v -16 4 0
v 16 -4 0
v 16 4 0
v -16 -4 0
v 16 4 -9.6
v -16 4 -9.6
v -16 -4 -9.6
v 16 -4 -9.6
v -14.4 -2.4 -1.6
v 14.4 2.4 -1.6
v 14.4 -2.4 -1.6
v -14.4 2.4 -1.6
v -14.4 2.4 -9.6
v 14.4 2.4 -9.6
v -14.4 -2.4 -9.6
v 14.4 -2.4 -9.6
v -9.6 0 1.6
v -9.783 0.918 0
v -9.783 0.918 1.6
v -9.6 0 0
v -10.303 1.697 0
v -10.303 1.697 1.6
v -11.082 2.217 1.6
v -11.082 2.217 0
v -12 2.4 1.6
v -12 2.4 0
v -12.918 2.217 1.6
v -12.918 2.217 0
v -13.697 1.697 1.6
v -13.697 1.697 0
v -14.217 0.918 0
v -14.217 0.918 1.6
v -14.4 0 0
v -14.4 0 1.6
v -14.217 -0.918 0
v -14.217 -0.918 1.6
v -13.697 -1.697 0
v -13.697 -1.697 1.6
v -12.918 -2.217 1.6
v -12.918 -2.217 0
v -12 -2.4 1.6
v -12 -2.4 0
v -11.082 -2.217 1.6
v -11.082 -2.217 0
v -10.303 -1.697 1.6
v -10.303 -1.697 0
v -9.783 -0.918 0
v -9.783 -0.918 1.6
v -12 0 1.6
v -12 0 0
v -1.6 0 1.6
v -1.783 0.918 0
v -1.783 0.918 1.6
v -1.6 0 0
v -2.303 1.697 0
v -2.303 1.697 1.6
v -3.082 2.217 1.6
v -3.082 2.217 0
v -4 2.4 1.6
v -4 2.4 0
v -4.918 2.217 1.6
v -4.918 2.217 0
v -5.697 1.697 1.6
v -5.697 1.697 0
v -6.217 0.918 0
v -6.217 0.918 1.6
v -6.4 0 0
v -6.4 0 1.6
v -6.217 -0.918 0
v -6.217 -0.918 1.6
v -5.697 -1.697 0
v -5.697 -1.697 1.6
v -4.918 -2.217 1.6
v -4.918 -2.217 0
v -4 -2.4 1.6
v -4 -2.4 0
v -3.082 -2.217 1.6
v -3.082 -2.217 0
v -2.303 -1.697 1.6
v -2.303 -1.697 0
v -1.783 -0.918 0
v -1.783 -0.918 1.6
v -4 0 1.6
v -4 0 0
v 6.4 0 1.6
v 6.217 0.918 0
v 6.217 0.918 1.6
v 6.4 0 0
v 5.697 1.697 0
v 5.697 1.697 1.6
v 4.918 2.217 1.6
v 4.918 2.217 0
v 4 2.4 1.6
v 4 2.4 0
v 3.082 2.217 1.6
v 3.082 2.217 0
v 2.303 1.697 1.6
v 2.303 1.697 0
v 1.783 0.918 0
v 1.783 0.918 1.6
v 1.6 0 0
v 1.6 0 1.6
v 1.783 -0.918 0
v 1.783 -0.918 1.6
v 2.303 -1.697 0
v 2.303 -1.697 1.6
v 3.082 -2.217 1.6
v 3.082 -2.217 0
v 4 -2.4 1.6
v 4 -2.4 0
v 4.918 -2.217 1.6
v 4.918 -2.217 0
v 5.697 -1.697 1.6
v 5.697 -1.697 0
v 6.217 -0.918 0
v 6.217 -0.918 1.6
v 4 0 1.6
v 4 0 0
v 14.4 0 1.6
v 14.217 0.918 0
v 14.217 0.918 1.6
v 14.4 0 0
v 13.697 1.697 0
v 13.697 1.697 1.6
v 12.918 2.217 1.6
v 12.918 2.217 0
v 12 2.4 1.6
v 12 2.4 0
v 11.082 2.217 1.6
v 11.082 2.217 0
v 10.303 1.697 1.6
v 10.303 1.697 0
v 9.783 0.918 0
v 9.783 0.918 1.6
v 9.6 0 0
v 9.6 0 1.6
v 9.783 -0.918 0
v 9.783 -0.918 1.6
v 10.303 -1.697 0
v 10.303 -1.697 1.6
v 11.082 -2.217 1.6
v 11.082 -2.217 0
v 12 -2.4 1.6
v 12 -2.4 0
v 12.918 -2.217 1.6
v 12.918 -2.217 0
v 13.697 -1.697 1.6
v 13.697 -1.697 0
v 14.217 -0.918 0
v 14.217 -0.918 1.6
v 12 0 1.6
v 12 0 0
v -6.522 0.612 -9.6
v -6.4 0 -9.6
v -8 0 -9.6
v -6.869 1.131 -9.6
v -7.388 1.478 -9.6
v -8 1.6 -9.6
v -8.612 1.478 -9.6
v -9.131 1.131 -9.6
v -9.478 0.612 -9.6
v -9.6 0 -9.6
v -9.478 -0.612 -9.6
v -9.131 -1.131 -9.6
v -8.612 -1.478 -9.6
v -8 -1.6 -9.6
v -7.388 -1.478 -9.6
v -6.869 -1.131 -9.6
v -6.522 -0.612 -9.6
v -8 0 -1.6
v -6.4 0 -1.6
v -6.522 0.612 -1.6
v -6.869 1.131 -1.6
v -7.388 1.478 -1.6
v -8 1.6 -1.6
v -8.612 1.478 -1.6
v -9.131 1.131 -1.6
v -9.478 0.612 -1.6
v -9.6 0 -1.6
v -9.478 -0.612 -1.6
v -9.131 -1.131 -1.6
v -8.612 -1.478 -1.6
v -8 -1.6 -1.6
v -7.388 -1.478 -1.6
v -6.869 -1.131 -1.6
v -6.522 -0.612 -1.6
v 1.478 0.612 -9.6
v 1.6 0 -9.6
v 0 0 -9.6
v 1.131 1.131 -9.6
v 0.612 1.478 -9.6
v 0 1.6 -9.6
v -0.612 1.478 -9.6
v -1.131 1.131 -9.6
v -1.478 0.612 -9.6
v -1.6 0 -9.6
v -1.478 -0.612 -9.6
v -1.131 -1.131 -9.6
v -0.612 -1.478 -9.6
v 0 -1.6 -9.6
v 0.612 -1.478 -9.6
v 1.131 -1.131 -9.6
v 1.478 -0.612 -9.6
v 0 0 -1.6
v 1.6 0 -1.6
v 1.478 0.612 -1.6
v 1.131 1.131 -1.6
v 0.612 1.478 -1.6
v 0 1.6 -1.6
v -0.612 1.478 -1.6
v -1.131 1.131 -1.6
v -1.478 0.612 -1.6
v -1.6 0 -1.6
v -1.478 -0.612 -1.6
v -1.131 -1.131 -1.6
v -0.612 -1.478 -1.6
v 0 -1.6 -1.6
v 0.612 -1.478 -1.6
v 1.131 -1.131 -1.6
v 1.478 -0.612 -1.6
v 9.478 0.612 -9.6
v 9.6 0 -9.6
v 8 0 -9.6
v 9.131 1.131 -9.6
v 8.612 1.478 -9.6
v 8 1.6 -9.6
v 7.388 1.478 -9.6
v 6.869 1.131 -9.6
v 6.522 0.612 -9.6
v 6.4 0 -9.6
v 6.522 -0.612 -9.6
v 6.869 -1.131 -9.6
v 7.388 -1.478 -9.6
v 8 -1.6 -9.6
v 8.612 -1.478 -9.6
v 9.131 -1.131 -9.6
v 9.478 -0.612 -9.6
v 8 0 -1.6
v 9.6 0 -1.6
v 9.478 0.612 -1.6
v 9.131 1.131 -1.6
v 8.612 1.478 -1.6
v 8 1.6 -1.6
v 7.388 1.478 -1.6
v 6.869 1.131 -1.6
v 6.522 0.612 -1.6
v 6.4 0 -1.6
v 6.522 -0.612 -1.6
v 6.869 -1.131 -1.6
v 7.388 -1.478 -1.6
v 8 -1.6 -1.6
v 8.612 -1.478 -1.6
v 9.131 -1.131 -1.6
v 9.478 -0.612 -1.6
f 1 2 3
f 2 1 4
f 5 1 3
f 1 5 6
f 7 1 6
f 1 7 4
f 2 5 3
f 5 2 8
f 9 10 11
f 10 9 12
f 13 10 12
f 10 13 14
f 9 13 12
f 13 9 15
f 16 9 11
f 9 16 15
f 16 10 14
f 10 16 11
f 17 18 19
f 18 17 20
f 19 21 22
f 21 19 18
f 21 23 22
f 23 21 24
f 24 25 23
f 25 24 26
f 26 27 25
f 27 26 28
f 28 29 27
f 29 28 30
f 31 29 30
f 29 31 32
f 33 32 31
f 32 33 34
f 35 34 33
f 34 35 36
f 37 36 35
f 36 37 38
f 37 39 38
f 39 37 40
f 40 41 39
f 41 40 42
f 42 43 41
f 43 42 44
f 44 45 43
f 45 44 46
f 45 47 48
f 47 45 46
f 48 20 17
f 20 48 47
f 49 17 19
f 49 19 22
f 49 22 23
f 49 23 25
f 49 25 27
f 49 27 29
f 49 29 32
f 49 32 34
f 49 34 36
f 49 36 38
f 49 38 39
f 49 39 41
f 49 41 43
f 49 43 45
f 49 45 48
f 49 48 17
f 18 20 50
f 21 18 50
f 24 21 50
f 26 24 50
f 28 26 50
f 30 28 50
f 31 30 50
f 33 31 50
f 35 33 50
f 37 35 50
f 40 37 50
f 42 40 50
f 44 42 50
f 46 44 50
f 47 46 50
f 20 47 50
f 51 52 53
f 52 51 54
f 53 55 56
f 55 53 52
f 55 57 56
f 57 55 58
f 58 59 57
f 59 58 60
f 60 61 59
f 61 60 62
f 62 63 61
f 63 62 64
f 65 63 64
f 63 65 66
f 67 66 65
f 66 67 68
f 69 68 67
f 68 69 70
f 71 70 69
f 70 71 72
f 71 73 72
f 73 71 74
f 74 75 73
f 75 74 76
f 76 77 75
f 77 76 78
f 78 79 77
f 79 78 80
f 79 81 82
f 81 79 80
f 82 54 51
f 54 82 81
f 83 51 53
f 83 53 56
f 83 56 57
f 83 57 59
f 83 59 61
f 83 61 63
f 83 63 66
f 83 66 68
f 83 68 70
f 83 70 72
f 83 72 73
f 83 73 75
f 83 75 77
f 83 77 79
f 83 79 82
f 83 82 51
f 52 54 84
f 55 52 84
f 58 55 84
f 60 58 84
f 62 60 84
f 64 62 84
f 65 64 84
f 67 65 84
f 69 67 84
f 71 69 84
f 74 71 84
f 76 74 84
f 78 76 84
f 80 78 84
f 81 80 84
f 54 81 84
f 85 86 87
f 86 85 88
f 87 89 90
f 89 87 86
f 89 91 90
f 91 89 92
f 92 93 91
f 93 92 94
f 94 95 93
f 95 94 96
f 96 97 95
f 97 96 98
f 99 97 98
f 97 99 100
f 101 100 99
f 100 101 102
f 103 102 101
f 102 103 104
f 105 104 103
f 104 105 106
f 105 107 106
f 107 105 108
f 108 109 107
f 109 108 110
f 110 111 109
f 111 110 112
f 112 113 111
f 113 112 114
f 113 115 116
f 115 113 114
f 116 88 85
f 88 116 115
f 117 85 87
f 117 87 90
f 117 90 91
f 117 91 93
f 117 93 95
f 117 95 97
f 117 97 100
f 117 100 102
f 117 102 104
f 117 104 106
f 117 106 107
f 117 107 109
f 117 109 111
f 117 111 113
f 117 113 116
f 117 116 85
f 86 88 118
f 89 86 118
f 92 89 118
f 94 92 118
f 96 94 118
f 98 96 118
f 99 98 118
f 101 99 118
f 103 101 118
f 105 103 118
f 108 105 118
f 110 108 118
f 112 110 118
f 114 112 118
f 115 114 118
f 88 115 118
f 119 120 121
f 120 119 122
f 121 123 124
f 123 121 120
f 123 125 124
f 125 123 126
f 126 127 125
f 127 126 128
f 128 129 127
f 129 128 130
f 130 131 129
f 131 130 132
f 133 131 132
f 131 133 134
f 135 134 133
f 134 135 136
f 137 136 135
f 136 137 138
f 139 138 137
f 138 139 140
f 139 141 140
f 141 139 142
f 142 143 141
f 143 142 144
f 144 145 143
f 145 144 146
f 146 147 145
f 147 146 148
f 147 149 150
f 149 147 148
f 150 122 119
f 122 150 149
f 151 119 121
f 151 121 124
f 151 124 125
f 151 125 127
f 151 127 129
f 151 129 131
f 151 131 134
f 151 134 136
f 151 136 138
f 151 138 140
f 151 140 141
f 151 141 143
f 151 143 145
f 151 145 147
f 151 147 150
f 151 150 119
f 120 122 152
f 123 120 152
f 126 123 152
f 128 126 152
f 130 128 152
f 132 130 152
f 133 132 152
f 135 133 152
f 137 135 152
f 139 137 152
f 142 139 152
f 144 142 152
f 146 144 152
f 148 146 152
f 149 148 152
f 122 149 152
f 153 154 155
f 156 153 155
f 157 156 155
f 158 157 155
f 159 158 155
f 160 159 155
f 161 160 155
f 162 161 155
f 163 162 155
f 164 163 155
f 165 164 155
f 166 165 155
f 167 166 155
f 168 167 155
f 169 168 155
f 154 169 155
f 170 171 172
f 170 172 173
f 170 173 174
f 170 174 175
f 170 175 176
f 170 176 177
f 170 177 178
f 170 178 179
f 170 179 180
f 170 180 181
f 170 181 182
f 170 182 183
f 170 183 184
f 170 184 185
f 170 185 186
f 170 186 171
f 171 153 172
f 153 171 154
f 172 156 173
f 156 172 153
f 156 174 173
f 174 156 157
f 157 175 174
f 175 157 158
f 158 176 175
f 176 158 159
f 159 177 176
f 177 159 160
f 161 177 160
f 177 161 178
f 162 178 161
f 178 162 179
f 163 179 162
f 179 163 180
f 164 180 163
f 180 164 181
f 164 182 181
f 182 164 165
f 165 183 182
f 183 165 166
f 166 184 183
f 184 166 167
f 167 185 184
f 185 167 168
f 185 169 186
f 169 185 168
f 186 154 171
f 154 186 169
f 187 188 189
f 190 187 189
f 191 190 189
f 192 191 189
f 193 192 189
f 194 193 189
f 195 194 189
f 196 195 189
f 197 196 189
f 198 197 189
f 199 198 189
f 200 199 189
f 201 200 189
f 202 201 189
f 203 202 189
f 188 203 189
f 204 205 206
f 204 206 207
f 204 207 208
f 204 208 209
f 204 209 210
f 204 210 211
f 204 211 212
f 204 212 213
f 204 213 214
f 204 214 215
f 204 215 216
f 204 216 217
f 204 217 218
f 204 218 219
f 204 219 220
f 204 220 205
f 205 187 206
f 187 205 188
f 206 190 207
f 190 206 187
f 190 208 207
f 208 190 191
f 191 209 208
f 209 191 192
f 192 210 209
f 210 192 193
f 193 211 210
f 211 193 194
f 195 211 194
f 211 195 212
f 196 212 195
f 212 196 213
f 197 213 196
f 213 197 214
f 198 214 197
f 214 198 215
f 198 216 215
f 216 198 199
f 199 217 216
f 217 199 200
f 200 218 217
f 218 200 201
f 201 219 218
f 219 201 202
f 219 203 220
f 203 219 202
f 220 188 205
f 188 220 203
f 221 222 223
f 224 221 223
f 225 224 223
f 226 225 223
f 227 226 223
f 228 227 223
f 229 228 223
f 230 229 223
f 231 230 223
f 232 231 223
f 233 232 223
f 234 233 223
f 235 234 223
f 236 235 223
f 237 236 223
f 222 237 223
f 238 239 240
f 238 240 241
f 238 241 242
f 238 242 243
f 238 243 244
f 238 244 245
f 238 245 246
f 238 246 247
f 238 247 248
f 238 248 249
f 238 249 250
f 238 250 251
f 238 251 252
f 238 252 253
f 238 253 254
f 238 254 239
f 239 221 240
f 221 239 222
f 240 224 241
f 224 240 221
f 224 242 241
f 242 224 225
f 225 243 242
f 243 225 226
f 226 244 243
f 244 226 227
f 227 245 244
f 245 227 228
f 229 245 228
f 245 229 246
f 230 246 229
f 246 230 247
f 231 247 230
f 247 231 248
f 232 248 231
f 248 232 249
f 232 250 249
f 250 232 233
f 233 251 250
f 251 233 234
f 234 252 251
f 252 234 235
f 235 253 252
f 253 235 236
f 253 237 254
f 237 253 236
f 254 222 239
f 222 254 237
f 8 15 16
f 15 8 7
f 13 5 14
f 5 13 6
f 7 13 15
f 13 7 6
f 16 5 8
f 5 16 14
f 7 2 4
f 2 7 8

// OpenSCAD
// file: ../p/4-4edge.scad
use <../lib.scad>
function ldraw_lib__4_4edge() = [
// 0 Circle 1.0
// 0 Name: 4-4edge.dat
// 0 Author: James Jessiman
// 0 !LDRAW_ORG Primitive UPDATE 2017-01
// 0 !LICENSE Licensed under CC BY 2.0 and CC BY 4.0 : see CAreadme.txt
// 
// 0 BFC CERTIFY CCW
  [0,"BFC","CERTIFY"],
  [0,"BFC","CCW"],
// 
// 0 !HISTORY 1998-12-15 [PTadmin] Official Update 1998-10
// 0 !HISTORY 2005-12-28 [PTadmin] Official Update 2005-01
// 0 !HISTORY 2007-06-24 [PTadmin] Header formatted for Contributor Agreement
// 0 !HISTORY 2008-07-01 [PTadmin] Official Update 2008-01
// 0 !HISTORY 2017-01-15 [Steffen] BFCed
// 0 !HISTORY 2017-12-30 [PTadmin] Official Update 2017-01
// 
// 
// 2 24 1 0 0 0.9239 0 0.3827
  [2,24,1,0,0,0.9239,0,0.3827],
// 2 24 0.9239 0 0.3827 0.7071 0 0.7071
  [2,24,0.9239,0,0.3827,0.7071,0,0.7071],
// 2 24 0.7071 0 0.7071 0.3827 0 0.9239
  [2,24,0.7071,0,0.7071,0.3827,0,0.9239],
// 2 24 0.3827 0 0.9239 0 0 1
  [2,24,0.3827,0,0.9239,0,0,1],
// 2 24 0 0 1 -0.3827 0 0.9239
  [2,24,0,0,1,-0.3827,0,0.9239],
// 2 24 -0.3827 0 0.9239 -0.7071 0 0.7071
  [2,24,-0.3827,0,0.9239,-0.7071,0,0.7071],
// 2 24 -0.7071 0 0.7071 -0.9239 0 0.3827
  [2,24,-0.7071,0,0.7071,-0.9239,0,0.3827],
// 2 24 -0.9239 0 0.3827 -1 0 -0
  [2,24,-0.9239,0,0.3827,-1,0,-0],
// 2 24 -1 0 -0 -0.9239 0 -0.3827
  [2,24,-1,0,-0,-0.9239,0,-0.3827],
// 2 24 -0.9239 0 -0.3827 -0.7071 0 -0.7071
  [2,24,-0.9239,0,-0.3827,-0.7071,0,-0.7071],
// 2 24 -0.7071 0 -0.7071 -0.3827 0 -0.9239
  [2,24,-0.7071,0,-0.7071,-0.3827,0,-0.9239],
// 2 24 -0.3827 0 -0.9239 0 0 -1
  [2,24,-0.3827,0,-0.9239,0,0,-1],
// 2 24 0 0 -1 0.3827 0 -0.9239
  [2,24,0,0,-1,0.3827,0,-0.9239],
// 2 24 0.3827 0 -0.9239 0.7071 0 -0.7071
  [2,24,0.3827,0,-0.9239,0.7071,0,-0.7071],
// 2 24 0.7071 0 -0.7071 0.9239 0 -0.3827
  [2,24,0.7071,0,-0.7071,0.9239,0,-0.3827],
// 2 24 0.9239 0 -0.3827 1 0 0
  [2,24,0.9239,0,-0.3827,1,0,0],
];
module ldraw_lib__4_4edge(step=0, col=false, unit=2/5, alt=false, line=0.2, solid=!$preview)
    makepoly(ldraw_lib__4_4edge(), step=step, col=col, unit=unit, alt=alt, line=line, solid=solid);
ldraw_lib__4_4edge(line=0.2);
// file: ../p/4-4disc.scad
use <../lib.scad>
function ldraw_lib__4_4disc() = [
// 0 Disc 1.0
// 0 Name: 4-4disc.dat
// 0 Author: James Jessiman
// 0 !LDRAW_ORG Primitive UPDATE 2002-02
// 0 !LICENSE Licensed under CC BY 2.0 and CC BY 4.0 : see CAreadme.txt
// 
// 0 BFC CERTIFY CCW
  [0,"BFC","CERTIFY"],
  [0,"BFC","CCW"],
// 
// 0 !HISTORY 1998-12-15 [PTadmin] Official Update 1998-10
// 0 !HISTORY 2002-03-23 [sbliss] Added BFC statement
// 0 !HISTORY 2002-04-25 [PTadmin] Official Update 2002-02
// 0 !HISTORY 2007-06-24 [PTadmin] Header formatted for Contributor Agreement
// 0 !HISTORY 2008-07-01 [PTadmin] Official Update 2008-01
// 
// 
// 3 16 0 0 0 1 0 0 0.9239 0 0.3827
  [3,16,0,0,0,1,0,0,0.9239,0,0.3827],
// 3 16 0 0 0 0.9239 0 0.3827 0.7071 0 0.7071
  [3,16,0,0,0,0.9239,0,0.3827,0.7071,0,0.7071],
// 3 16 0 0 0 0.7071 0 0.7071 0.3827 0 0.9239
  [3,16,0,0,0,0.7071,0,0.7071,0.3827,0,0.9239],
// 3 16 0 0 0 0.3827 0 0.9239 0 0 1
  [3,16,0,0,0,0.3827,0,0.9239,0,0,1],
// 3 16 0 0 0 0 0 1 -0.3827 0 0.9239
  [3,16,0,0,0,0,0,1,-0.3827,0,0.9239],
// 3 16 0 0 0 -0.3827 0 0.9239 -0.7071 0 0.7071
  [3,16,0,0,0,-0.3827,0,0.9239,-0.7071,0,0.7071],
// 3 16 0 0 0 -0.7071 0 0.7071 -0.9239 0 0.3827
  [3,16,0,0,0,-0.7071,0,0.7071,-0.9239,0,0.3827],
// 3 16 0 0 0 -0.9239 0 0.3827 -1 0 -0
  [3,16,0,0,0,-0.9239,0,0.3827,-1,0,-0],
// 3 16 0 0 0 -1 0 -0 -0.9239 0 -0.3827
  [3,16,0,0,0,-1,0,-0,-0.9239,0,-0.3827],
// 3 16 0 0 0 -0.9239 0 -0.3827 -0.7071 0 -0.7071
  [3,16,0,0,0,-0.9239,0,-0.3827,-0.7071,0,-0.7071],
// 3 16 0 0 0 -0.7071 0 -0.7071 -0.3827 0 -0.9239
  [3,16,0,0,0,-0.7071,0,-0.7071,-0.3827,0,-0.9239],
// 3 16 0 0 0 -0.3827 0 -0.9239 0 0 -1
  [3,16,0,0,0,-0.3827,0,-0.9239,0,0,-1],
// 3 16 0 0 0 0 0 -1 0.3827 0 -0.9239
  [3,16,0,0,0,0,0,-1,0.3827,0,-0.9239],
// 3 16 0 0 0 0.3827 0 -0.9239 0.7071 0 -0.7071
  [3,16,0,0,0,0.3827,0,-0.9239,0.7071,0,-0.7071],
// 3 16 0 0 0 0.7071 0 -0.7071 0.9239 0 -0.3827
  [3,16,0,0,0,0.7071,0,-0.7071,0.9239,0,-0.3827],
// 3 16 0 0 0 0.9239 0 -0.3827 1 0 0
  [3,16,0,0,0,0.9239,0,-0.3827,1,0,0],
// 0
];
module ldraw_lib__4_4disc(step=0, col=false, unit=2/5, alt=false, line=0.2, solid=!$preview)
    makepoly(ldraw_lib__4_4disc(), step=step, col=col, unit=unit, alt=alt, line=line, solid=solid);
ldraw_lib__4_4disc(line=0.2);
// file: ../p/4-4cyli.scad
use <../lib.scad>
$fa=1; $fs=0.2;
function ldraw_lib__4_4cyli(realsolid=false) = [
// 0 Cylinder 1.0
// 0 Name: 4-4cyli.dat
// 0 Author: James Jessiman
// 0 !LDRAW_ORG Primitive UPDATE 2005-01
// 0 !LICENSE Licensed under CC BY 2.0 and CC BY 4.0 : see CAreadme.txt
// 
// 0 BFC CERTIFY CCW
  [0,"BFC","CERTIFY"],
  [0,"BFC","CCW"],
// 
// 0 !HISTORY 1998-12-15 [PTadmin] Official Update 1998-10
// 0 !HISTORY 2002-03-23 [sbliss] Added BFC statement; merged headers from files in distributions LDraw 0.27 and Complete.
// 0 !HISTORY 2002-04-25 [PTadmin] Official Update 2002-02
// 0 !HISTORY 2004-12-14 [guyvivan] BFC CCW
// 0 !HISTORY 2005-12-28 [PTadmin] Official Update 2005-01
// 0 !HISTORY 2007-06-24 [PTadmin] Header formatted for Contributor Agreement
// 0 !HISTORY 2008-07-01 [PTadmin] Official Update 2008-01
// 
// 
// 4 16 1 1 0 0.9239 1 0.3827 0.9239 0 0.3827 1 0 0
  [4,16,1,1,0,0.9239,1,0.3827,0.9239,0,0.3827,1,0,0],
// 5 24 1 0 0 1 1 0 0.9239 0 0.3827 0.9239 0 -0.3827
  [5,24,1,0,0,1,1,0,0.9239,0,0.3827,0.9239,0,-0.3827],
// 4 16 0.9239 1 0.3827 0.7071 1 0.7071 0.7071 0 0.7071 0.9239 0 0.3827
  [4,16,0.9239,1,0.3827,0.7071,1,0.7071,0.7071,0,0.7071,0.9239,0,0.3827],
// 5 24 0.9239 0 0.3827 0.9239 1 0.3827 0.7071 0 0.7071 1 0 0
  [5,24,0.9239,0,0.3827,0.9239,1,0.3827,0.7071,0,0.7071,1,0,0],
// 4 16 0.7071 1 0.7071 0.3827 1 0.9239 0.3827 0 0.9239 0.7071 0 0.7071
  [4,16,0.7071,1,0.7071,0.3827,1,0.9239,0.3827,0,0.9239,0.7071,0,0.7071],
// 5 24 0.7071 0 0.7071 0.7071 1 0.7071 0.3827 0 0.9239 0.9239 0 0.3827
  [5,24,0.7071,0,0.7071,0.7071,1,0.7071,0.3827,0,0.9239,0.9239,0,0.3827],
// 4 16 0.3827 1 0.9239 0 1 1 0 0 1 0.3827 0 0.9239
  [4,16,0.3827,1,0.9239,0,1,1,0,0,1,0.3827,0,0.9239],
// 5 24 0.3827 0 0.9239 0.3827 1 0.9239 0 0 1 0.7071 0 0.7071
  [5,24,0.3827,0,0.9239,0.3827,1,0.9239,0,0,1,0.7071,0,0.7071],
// 4 16 0 1 1 -0.3827 1 0.9239 -0.3827 0 0.9239 0 0 1
  [4,16,0,1,1,-0.3827,1,0.9239,-0.3827,0,0.9239,0,0,1],
// 5 24 0 0 1 0 1 1 -0.3827 0 0.9239 0.3827 0 0.9239
  [5,24,0,0,1,0,1,1,-0.3827,0,0.9239,0.3827,0,0.9239],
// 4 16 -0.3827 1 0.9239 -0.7071 1 0.7071 -0.7071 0 0.7071 -0.3827 0 0.9239
  [4,16,-0.3827,1,0.9239,-0.7071,1,0.7071,-0.7071,0,0.7071,-0.3827,0,0.9239],
// 5 24 -0.3827 0 0.9239 -0.3827 1 0.9239 -0.7071 0 0.7071 0 0 1
  [5,24,-0.3827,0,0.9239,-0.3827,1,0.9239,-0.7071,0,0.7071,0,0,1],
// 4 16 -0.7071 1 0.7071 -0.9239 1 0.3827 -0.9239 0 0.3827 -0.7071 0 0.7071
  [4,16,-0.7071,1,0.7071,-0.9239,1,0.3827,-0.9239,0,0.3827,-0.7071,0,0.7071],
// 5 24 -0.7071 0 0.7071 -0.7071 1 0.7071 -0.9239 0 0.3827 -0.3827 0 0.9239
  [5,24,-0.7071,0,0.7071,-0.7071,1,0.7071,-0.9239,0,0.3827,-0.3827,0,0.9239],
// 4 16 -0.9239 1 0.3827 -1 1 0 -1 0 0 -0.9239 0 0.3827
  [4,16,-0.9239,1,0.3827,-1,1,0,-1,0,0,-0.9239,0,0.3827],
// 5 24 -0.9239 0 0.3827 -0.9239 1 0.3827 -1 0 0 -0.7071 0 0.7071
  [5,24,-0.9239,0,0.3827,-0.9239,1,0.3827,-1,0,0,-0.7071,0,0.7071],
// 4 16 -1 1 0 -0.9239 1 -0.3827 -0.9239 0 -0.3827 -1 0 0
  [4,16,-1,1,0,-0.9239,1,-0.3827,-0.9239,0,-0.3827,-1,0,0],
// 5 24 -1 0 0 -1 1 0 -0.9239 0 -0.3827 -0.9239 0 0.3827
  [5,24,-1,0,0,-1,1,0,-0.9239,0,-0.3827,-0.9239,0,0.3827],
// 4 16 -0.9239 1 -0.3827 -0.7071 1 -0.7071 -0.7071 0 -0.7071 -0.9239 0 -0.3827
  [4,16,-0.9239,1,-0.3827,-0.7071,1,-0.7071,-0.7071,0,-0.7071,-0.9239,0,-0.3827],
// 5 24 -0.9239 0 -0.3827 -0.9239 1 -0.3827 -0.7071 0 -0.7071 -1 0 0
  [5,24,-0.9239,0,-0.3827,-0.9239,1,-0.3827,-0.7071,0,-0.7071,-1,0,0],
// 4 16 -0.7071 1 -0.7071 -0.3827 1 -0.9239 -0.3827 0 -0.9239 -0.7071 0 -0.7071
  [4,16,-0.7071,1,-0.7071,-0.3827,1,-0.9239,-0.3827,0,-0.9239,-0.7071,0,-0.7071],
// 5 24 -0.7071 0 -0.7071 -0.7071 1 -0.7071 -0.3827 0 -0.9239 -0.9239 0 -0.3827
  [5,24,-0.7071,0,-0.7071,-0.7071,1,-0.7071,-0.3827,0,-0.9239,-0.9239,0,-0.3827],
// 4 16 -0.3827 1 -0.9239 0 1 -1 0 0 -1 -0.3827 0 -0.9239
  [4,16,-0.3827,1,-0.9239,0,1,-1,0,0,-1,-0.3827,0,-0.9239],
// 5 24 -0.3827 0 -0.9239 -0.3827 1 -0.9239 0 0 -1 -0.7071 0 -0.7071
  [5,24,-0.3827,0,-0.9239,-0.3827,1,-0.9239,0,0,-1,-0.7071,0,-0.7071],
// 4 16 0 1 -1 0.3827 1 -0.9239 0.3827 0 -0.9239 0 0 -1
  [4,16,0,1,-1,0.3827,1,-0.9239,0.3827,0,-0.9239,0,0,-1],
// 5 24 0 0 -1 0 1 -1 0.3827 0 -0.9239 -0.3827 0 -0.9239
  [5,24,0,0,-1,0,1,-1,0.3827,0,-0.9239,-0.3827,0,-0.9239],
// 4 16 0.3827 1 -0.9239 0.7071 1 -0.7071 0.7071 0 -0.7071 0.3827 0 -0.9239
  [4,16,0.3827,1,-0.9239,0.7071,1,-0.7071,0.7071,0,-0.7071,0.3827,0,-0.9239],
// 5 24 0.3827 0 -0.9239 0.3827 1 -0.9239 0.7071 0 -0.7071 0 0 -1
  [5,24,0.3827,0,-0.9239,0.3827,1,-0.9239,0.7071,0,-0.7071,0,0,-1],
// 4 16 0.7071 1 -0.7071 0.9239 1 -0.3827 0.9239 0 -0.3827 0.7071 0 -0.7071
  [4,16,0.7071,1,-0.7071,0.9239,1,-0.3827,0.9239,0,-0.3827,0.7071,0,-0.7071],
// 5 24 0.7071 0 -0.7071 0.7071 1 -0.7071 0.9239 0 -0.3827 0.3827 0 -0.9239
  [5,24,0.7071,0,-0.7071,0.7071,1,-0.7071,0.9239,0,-0.3827,0.3827,0,-0.9239],
// 4 16 0.9239 1 -0.3827 1 1 0 1 0 0 0.9239 0 -0.3827
  [4,16,0.9239,1,-0.3827,1,1,0,1,0,0,0.9239,0,-0.3827],
// 5 24 0.9239 0 -0.3827 0.9239 1 -0.3827 1 0 0 0.7071 0 -0.7071
  [5,24,0.9239,0,-0.3827,0.9239,1,-0.3827,1,0,0,0.7071,0,-0.7071],
// 0
];
module ldraw_lib__4_4cyli(step=0, col=false, unit=2/5, alt=false, line=0.2, solid=!$preview)
    makepoly(ldraw_lib__4_4cyli(solid), step=step, col=col, unit=unit, alt=alt, line=line, solid=solid);
ldraw_lib__4_4cyli(line=0.2);
// file: ../p/stud3.scad
use <../lib.scad>
use <4-4cyli.scad>
use <4-4disc.scad>
use <4-4edge.scad>
function ldraw_lib__stud3() = [
// 0 Stud Tube Solid
// 0 Name: stud3.dat
// 0 Author: James Jessiman
// 0 !LDRAW_ORG Primitive UPDATE 2012-01
// 0 !LICENSE Licensed under CC BY 4.0 : see CAreadme.txt
// 
// 0 BFC CERTIFY CCW
  [0,"BFC","CERTIFY"],
  [0,"BFC","CCW"],
// 
// 0 !HISTORY 2002-04-04 [sbliss] Modified for BFC compliance
// 0 !HISTORY 2002-04-25 [PTadmin] Official Update 2002-02
// 0 !HISTORY 2007-06-24 [PTadmin] Header formatted for Contributor Agreement
// 0 !HISTORY 2008-07-01 [PTadmin] Official Update 2008-01
// 0 !HISTORY 2012-02-16 [Philo] Changed to CCW
// 0 !HISTORY 2012-03-30 [PTadmin] Official Update 2012-01
// 
// 
// 1 16 0 -4 0 4 0 0 0 1 0 0 0 4 4-4edge.dat
  [1,16,0,-4,0,4,0,0,0,1,0,0,0,4, ldraw_lib__4_4edge()],
// 1 16 0 0 0 4 0 0 0 1 0 0 0 4 4-4edge.dat
  [1,16,0,0,0,4,0,0,0,1,0,0,0,4, ldraw_lib__4_4edge()],
// 1 16 0 -4 0 4 0 0 0 1 0 0 0 4 4-4disc.dat
  [1,16,0,-4,0,4,0,0,0,1,0,0,0,4, ldraw_lib__4_4disc()],
  [-1,16,0,0,0,4,0,0,0,-1,0,0,0,4, ldraw_lib__4_4disc()],
// 1 16 0 -4 0 4 0 0 0 4 0 0 0 4 4-4cyli.dat
  [1,16,0,-4,0,4,0,0,0,4,0,0,0,4, ldraw_lib__4_4cyli()],
];
module ldraw_lib__stud3(step=0, col=false, unit=2/5, alt=false, line=0.2, solid=!$preview)
    makepoly(ldraw_lib__stud3(), step=step, col=col, unit=unit, alt=alt, line=line, solid=solid);
ldraw_lib__stud3(line=0.2);
// file: ../p/stud.scad
use <../lib.scad>
use <4-4cyli.scad>
use <4-4disc.scad>
use <4-4edge.scad>
function ldraw_lib__stud() = [
// 0 Stud
// 0 Name: stud.dat
// 0 Author: James Jessiman
// 0 !LDRAW_ORG Primitive UPDATE 2012-01
// 0 !LICENSE Licensed under CC BY 4.0 : see CAreadme.txt
// 
// 0 BFC CERTIFY CCW
  [0,"BFC","CERTIFY"],
  [0,"BFC","CCW"],
// 
// 0 !HISTORY 2002-04-04 [sbliss] Modified for BFC compliance
// 0 !HISTORY 2002-04-25 [PTadmin] Official Update 2002-02
// 0 !HISTORY 2007-06-24 [PTadmin] Header formatted for Contributor Agreement
// 0 !HISTORY 2008-07-01 [PTadmin] Official Update 2008-01
// 0 !HISTORY 2012-02-16 [Philo] Changed to CCW
// 0 !HISTORY 2012-03-30 [PTadmin] Official Update 2012-01
// 
// 
// 1 16 0 0 0 6 0 0 0 1 0 0 0 6 4-4edge.dat
  [1,16,0,0,0,6,0,0,0,1,0,0,0,6, ldraw_lib__4_4edge()],
// 1 16 0 -4 0 6 0 0 0 1 0 0 0 6 4-4edge.dat
  [1,16,0,-4,0,6,0,0,0,1,0,0,0,6, ldraw_lib__4_4edge()],
// 1 16 0 0 0 6 0 0 0 -4 0 0 0 6 4-4cyli.dat
  [1,16,0,0,0,6,0,0,0,-4,0,0,0,6, ldraw_lib__4_4cyli()],
// 1 16 0 -4 0 6 0 0 0 1 0 0 0 6 4-4disc.dat
  [1,16,0,-4,0,6,0,0,0,1,0,0,0,6, ldraw_lib__4_4disc()],
  [-1,16,0,0,0,6,0,0,0,-1,0,0,0,6, ldraw_lib__4_4disc()],
];
module ldraw_lib__stud(step=0, col=false, unit=2/5, alt=false, line=0.2, solid=!$preview)
    makepoly(ldraw_lib__stud(), step=step, col=col, unit=unit, alt=alt, line=line, solid=solid);
ldraw_lib__stud(line=0.2);
// file: ../p/box5.scad
use <../lib.scad>
function ldraw_lib__box5() = [
// 0 Box with 5 Faces and All Edges
// 0 Name: box5.dat
// 0 Author: James Jessiman
// 0 !LDRAW_ORG Primitive UPDATE 2012-01
// 0 !LICENSE Licensed under CC BY 2.0 and CC BY 4.0 : see CAreadme.txt
// 
// 0 BFC CERTIFY CCW
  [0,"BFC","CERTIFY"],
  [0,"BFC","CCW"],
// 
// 0 !HISTORY 2002-04-03 [sbliss] Modified for BFC compliance
// 0 !HISTORY 2002-04-25 [PTadmin] Official Update 2002-02
// 0 !HISTORY 2007-06-24 [PTadmin] Header formatted for Contributor Agreement
// 0 !HISTORY 2008-07-01 [PTadmin] Official Update 2008-01
// 0 !HISTORY 2012-02-16 [Philo] Changed to CCW
// 0 !HISTORY 2012-03-30 [PTadmin] Official Update 2012-01
// 
// 
// 2 24 1 1 1 -1 1 1
  [2,24,1,1,1,-1,1,1],
// 2 24 -1 1 1 -1 1 -1
  [2,24,-1,1,1,-1,1,-1],
// 2 24 -1 1 -1 1 1 -1
  [2,24,-1,1,-1,1,1,-1],
// 2 24 1 1 -1 1 1 1
  [2,24,1,1,-1,1,1,1],
// 2 24 1 0 1 -1 0 1
  [2,24,1,0,1,-1,0,1],
// 2 24 -1 0 1 -1 0 -1
  [2,24,-1,0,1,-1,0,-1],
// 2 24 -1 0 -1 1 0 -1
  [2,24,-1,0,-1,1,0,-1],
// 2 24 1 0 -1 1 0 1
  [2,24,1,0,-1,1,0,1],
// 2 24 1 0 1 1 1 1
  [2,24,1,0,1,1,1,1],
// 2 24 -1 0 1 -1 1 1
  [2,24,-1,0,1,-1,1,1],
// 2 24 1 0 -1 1 1 -1
  [2,24,1,0,-1,1,1,-1],
// 2 24 -1 0 -1 -1 1 -1
  [2,24,-1,0,-1,-1,1,-1],
// 4 16 -1 1 1 1 1 1 1 1 -1 -1 1 -1
  [4,16,-1,1,1,1,1,1,1,1,-1,-1,1,-1],
// 4 16 -1 1 1 -1 0 1 1 0 1 1 1 1
  [4,16,-1,1,1,-1,0,1,1,0,1,1,1,1],
// 4 16 -1 1 -1 -1 0 -1 -1 0 1 -1 1 1
  [4,16,-1,1,-1,-1,0,-1,-1,0,1,-1,1,1],
// 4 16 1 1 -1 1 0 -1 -1 0 -1 -1 1 -1
  [4,16,1,1,-1,1,0,-1,-1,0,-1,-1,1,-1],
// 4 16 1 1 1 1 0 1 1 0 -1 1 1 -1
  [4,16,1,1,1,1,0,1,1,0,-1,1,1,-1],
];
makepoly(ldraw_lib__box5(), line=0.2);
// file: ../p/box4t.scad
use <../lib.scad>
function ldraw_lib__box4t() = [
// 0 Box with 4 Adjacent Faces and All Edges
// 0 Name: box4t.dat
// 0 Author: Tore Eriksson [Tore_Eriksson]
// 0 !LDRAW_ORG Primitive UPDATE 2003-02
// 0 !LICENSE Licensed under CC BY 2.0 and CC BY 4.0 : see CAreadme.txt
// 
// 0 BFC CERTIFY CCW
  [0,"BFC","CERTIFY"],
  [0,"BFC","CCW"],
// 
// 0 !HISTORY 1997-09-29 [PTadmin] Official Update 1997-15
// 0 !HISTORY 2002-08-31 [izanette] Modified with WINDZ for BFC compliance
// 0 !HISTORY 2003-08-01 [PTadmin] Official Update 2003-02
// 0 !HISTORY 2007-06-24 [PTadmin] Header formatted for Contributor Agreement
// 0 !HISTORY 2008-07-01 [PTadmin] Official Update 2008-01
// 
// 
// 2 24 1 1 1 -1 1 1
  [2,24,1,1,1,-1,1,1],
// 2 24 -1 1 1 -1 1 -1
  [2,24,-1,1,1,-1,1,-1],
// 2 24 -1 1 -1 1 1 -1
  [2,24,-1,1,-1,1,1,-1],
// 2 24 1 1 -1 1 1 1
  [2,24,1,1,-1,1,1,1],
// 2 24 1 0 1 -1 0 1
  [2,24,1,0,1,-1,0,1],
// 2 24 -1 0 1 -1 0 -1
  [2,24,-1,0,1,-1,0,-1],
// 2 24 -1 0 -1 1 0 -1
  [2,24,-1,0,-1,1,0,-1],
// 2 24 1 0 -1 1 0 1
  [2,24,1,0,-1,1,0,1],
// 2 24 1 0 1 1 1 1
  [2,24,1,0,1,1,1,1],
// 2 24 -1 0 1 -1 1 1
  [2,24,-1,0,1,-1,1,1],
// 2 24 1 0 -1 1 1 -1
  [2,24,1,0,-1,1,1,-1],
// 2 24 -1 0 -1 -1 1 -1
  [2,24,-1,0,-1,-1,1,-1],
// 4 16 1 1 1 1 1 -1 -1 1 -1 -1 1 1
  [4,16,1,1,1,1,1,-1,-1,1,-1,-1,1,1],
// 4 16 1 1 1 -1 1 1 -1 0 1 1 0 1
  [4,16,1,1,1,-1,1,1,-1,0,1,1,0,1],
// 4 16 -1 1 1 -1 1 -1 -1 0 -1 -1 0 1
  [4,16,-1,1,1,-1,1,-1,-1,0,-1,-1,0,1],
// 0 4 16 -1 1 -1 -1 0 -1 1 0 -1 1 1 -1
// 4 16 1 1 -1 1 1 1 1 0 1 1 0 -1
  [4,16,1,1,-1,1,1,1,1,0,1,1,0,-1],
// 0
];
makepoly(ldraw_lib__box4t(), line=0.2);
// file: s/3010s01.scad
use <../../lib.scad>
use <../../p/box4t.scad>
use <../../p/box5.scad>
use <../../p/stud.scad>
use <../../p/stud3.scad>
$fa=1; $fs=0.2;
function ldraw_lib__s__3010s01(realsolid=false) = [
// 0 ~Brick  1 x  4 without Front Face
// 0 Name: s\3010s01.dat
// 0 Author: Tony Hafner [hafhead]
// 0 !LDRAW_ORG Subpart UPDATE 2003-02
// 0 !LICENSE Licensed under CC BY 2.0 and CC BY 4.0 : see CAreadme.txt
// 
// 0 BFC CERTIFY CW
  [0,"BFC","CERTIFY"],
  [0,"BFC","CW"],
// 
// 0 !HISTORY 2003-08-01 [PTadmin] Official Update 2003-02
// 0 !HISTORY 2007-08-29 [PTadmin] Header formatted for Contributor Agreement
// 0 !HISTORY 2008-07-01 [PTadmin] Official Update 2008-01
// 
// 
// 1 16 0 24 0 40 0 0 0 -24 0 0 0 10 box4t.dat
  [1,16,0,24,0,40,0,0,0,-24,0,0,0,10, ldraw_lib__box4t(realsolid)],
// 0 BFC INVERTNEXT
  [0,"BFC","INVERTNEXT"],
// 1 16 0 24 0 36 0 0 0 -20 0 0 0 6 box5.dat
  [1,16,0,24,0,36,0,0,0,-20,0,0,0,6, ldraw_lib__box5(realsolid)],
// 1 16 -30 0 0 1 0 0 0 1 0 0 0 1 stud.dat
  [1,16,-30,0,0,1,0,0,0,1,0,0,0,1, ldraw_lib__stud(realsolid)],
// 1 16 -10 0 0 1 0 0 0 1 0 0 0 1 stud.dat
  [1,16,-10,0,0,1,0,0,0,1,0,0,0,1, ldraw_lib__stud(realsolid)],
// 1 16 10 0 0 1 0 0 0 1 0 0 0 1 stud.dat
  [1,16,10,0,0,1,0,0,0,1,0,0,0,1, ldraw_lib__stud(realsolid)],
// 1 16 30 0 0 1 0 0 0 1 0 0 0 1 stud.dat
  [1,16,30,0,0,1,0,0,0,1,0,0,0,1, ldraw_lib__stud(realsolid)],
// 1 16 -20 4 0 1 0 0 0 -5 0 0 0 1 stud3.dat
  [1,16,-20,4,0,1,0,0,0,-5,0,0,0,1, ldraw_lib__stud3(realsolid)],
// 1 16 0 4 0 1 0 0 0 -5 0 0 0 1 stud3.dat
  [1,16,0,4,0,1,0,0,0,-5,0,0,0,1, ldraw_lib__stud3(realsolid)],
// 1 16 20 4 0 1 0 0 0 -5 0 0 0 1 stud3.dat
  [1,16,20,4,0,1,0,0,0,-5,0,0,0,1, ldraw_lib__stud3(realsolid)],
// 4 16 -40 24 -10 40 24 -10 36 24 -6 -36 24 -6
  [4,16,-40,24,-10,40,24,-10,36,24,-6,-36,24,-6],
// 4 16 -40 24 10 -36 24 6 36 24 6 40 24 10
  [4,16,-40,24,10,-36,24,6,36,24,6,40,24,10],
// 4 16 -40 24 -10 -36 24 -6 -36 24 6 -40 24 10
  [4,16,-40,24,-10,-36,24,-6,-36,24,6,-40,24,10],
// 4 16 40 24 -10 40 24 10 36 24 6 36 24 -6
  [4,16,40,24,-10,40,24,10,36,24,6,36,24,-6],
// 0
];
module ldraw_lib__s__3010s01(step=0, col=false, unit=2/5, alt=false, line=0.2, solid=!$preview)
    makepoly(ldraw_lib__s__3010s01(solid), step=step, col=col, unit=unit, alt=alt, line=line, solid=solid);
ldraw_lib__s__3010s01(line=0.2);
// main file
use <../lib.scad>
use <s/3010s01.scad>
function ldraw_lib__3010() = [
// 0 Brick  1 x  4
// 0 Name: 3010.dat
// 0 Author: James Jessiman
// 0 !LDRAW_ORG Part UPDATE 2025-09
// 0 !LICENSE Licensed under CC BY 4.0 : see CAreadme.txt
// 
// 0 BFC CERTIFY CCW
  [0,"BFC","CERTIFY"],
  [0,"BFC","CCW"],
// 
// 0 !HISTORY 2001-10-26 [PTadmin] Official Update 2001-01
// 0 !HISTORY 2002-05-07 {unknown} BFC Certification
// 0 !HISTORY 2002-06-11 [PTadmin] Official Update 2002-03
// 0 !HISTORY 2002-12-12 [hafhead] New subparted version
// 0 !HISTORY 2003-08-01 [PTadmin] Official Update 2003-02
// 0 !HISTORY 2007-06-06 [PTadmin] Header formatted for Contributor Agreement
// 0 !HISTORY 2008-07-01 [PTadmin] Official Update 2008-01
// 0 !HISTORY 2025-09-27 [OrionP] Changed winding to CCW
// 0 !HISTORY 2025-09-29 [OrionP] Official Update 2025-09
// 
// 1 16 0 0 0 1 0 0 0 1 0 0 0 1 s\3010s01.dat
  [1,16,0,0,0,1,0,0,0,1,0,0,0,1, ldraw_lib__s__3010s01()],
// 4 16 -40 24 -10 40 24 -10 40 0 -10 -40 0 -10
  [4,16,-40,24,-10,40,24,-10,40,0,-10,-40,0,-10],
// 0
];
module ldraw_lib__3010(step=0, col=false, unit=2/5, alt=false, line=0.2, solid=!$preview)
    makepoly(ldraw_lib__3010(), step=step, col=col, unit=unit, alt=alt, line=line, solid=solid);
ldraw_lib__3010(line=0.2);
